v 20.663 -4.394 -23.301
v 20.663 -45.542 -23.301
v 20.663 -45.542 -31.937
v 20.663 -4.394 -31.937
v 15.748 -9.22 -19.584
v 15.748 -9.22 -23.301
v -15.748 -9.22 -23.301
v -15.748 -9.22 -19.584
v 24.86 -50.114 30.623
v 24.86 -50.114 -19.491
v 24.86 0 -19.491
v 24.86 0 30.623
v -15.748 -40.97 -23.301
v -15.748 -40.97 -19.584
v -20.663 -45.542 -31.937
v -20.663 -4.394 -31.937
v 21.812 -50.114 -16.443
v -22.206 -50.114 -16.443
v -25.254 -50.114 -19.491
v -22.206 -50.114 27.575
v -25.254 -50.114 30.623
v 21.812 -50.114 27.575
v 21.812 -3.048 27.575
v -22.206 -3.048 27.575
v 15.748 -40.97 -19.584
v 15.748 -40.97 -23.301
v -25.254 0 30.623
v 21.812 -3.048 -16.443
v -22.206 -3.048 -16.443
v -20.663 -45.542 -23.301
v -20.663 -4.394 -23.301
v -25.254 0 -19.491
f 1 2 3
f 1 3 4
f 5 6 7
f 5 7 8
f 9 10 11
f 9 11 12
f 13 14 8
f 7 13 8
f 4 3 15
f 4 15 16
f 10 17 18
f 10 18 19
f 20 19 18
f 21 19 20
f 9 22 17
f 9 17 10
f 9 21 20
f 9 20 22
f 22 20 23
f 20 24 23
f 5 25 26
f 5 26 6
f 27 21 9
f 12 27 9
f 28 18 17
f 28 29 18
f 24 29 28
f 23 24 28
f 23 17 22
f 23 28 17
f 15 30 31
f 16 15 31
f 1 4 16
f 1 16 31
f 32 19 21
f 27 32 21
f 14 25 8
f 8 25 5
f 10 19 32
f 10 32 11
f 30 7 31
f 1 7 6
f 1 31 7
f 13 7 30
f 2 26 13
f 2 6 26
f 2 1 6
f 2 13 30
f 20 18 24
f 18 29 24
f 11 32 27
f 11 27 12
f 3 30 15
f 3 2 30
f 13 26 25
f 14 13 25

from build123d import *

# Parameters (mm, degrees)
F0_W     = 50.1142
F0_H     = 50.1142
F1_DEPTH = 50.1142
F2_T     = -3.048
F3_W     = 31.75
F3_H     = 3.7164964166
F4_DEPTH = 15.748
F5_DEPTH = 20.6629


with BuildPart() as f1:
    # F0 (on Front) → F1 (new body)
    with BuildSketch(Plane.XZ):
        with Locations((-0.1968266442, 5.5663594662)):
            Rectangle(F0_W, F0_H)
    extrude(amount=F1_DEPTH)

    # F2
    f2_openings = [f1.faces().sort_by_distance(p)[0] for p in [
        (-0.196827, -50.1142, 5.566359),
    ]]
    offset(amount=F2_T, openings=f2_openings)


with BuildPart() as f4:
    # F3 (on Right) → F4 (new body, symmetric)
    with BuildSketch(Plane.YZ):
        with Locations((-25.0952, -21.4424923255)):
            Rectangle(F3_W, F3_H)
    extrude(amount=F4_DEPTH, both=True)

    # F3 (on Right) → F5 (join, symmetric)
    with BuildSketch(Plane.YZ):
        Polygon((-9.2202, -23.3007405338), (-40.9702, -23.3007405338), (-45.5422, -23.3007405338), (-45.5422, -31.9367405338), (-4.3942, -31.9367405338), (-4.3942, -23.3007405338), align=None)
    extrude(amount=F5_DEPTH, both=True)


solid = Compound([f1.part, f4.part])
